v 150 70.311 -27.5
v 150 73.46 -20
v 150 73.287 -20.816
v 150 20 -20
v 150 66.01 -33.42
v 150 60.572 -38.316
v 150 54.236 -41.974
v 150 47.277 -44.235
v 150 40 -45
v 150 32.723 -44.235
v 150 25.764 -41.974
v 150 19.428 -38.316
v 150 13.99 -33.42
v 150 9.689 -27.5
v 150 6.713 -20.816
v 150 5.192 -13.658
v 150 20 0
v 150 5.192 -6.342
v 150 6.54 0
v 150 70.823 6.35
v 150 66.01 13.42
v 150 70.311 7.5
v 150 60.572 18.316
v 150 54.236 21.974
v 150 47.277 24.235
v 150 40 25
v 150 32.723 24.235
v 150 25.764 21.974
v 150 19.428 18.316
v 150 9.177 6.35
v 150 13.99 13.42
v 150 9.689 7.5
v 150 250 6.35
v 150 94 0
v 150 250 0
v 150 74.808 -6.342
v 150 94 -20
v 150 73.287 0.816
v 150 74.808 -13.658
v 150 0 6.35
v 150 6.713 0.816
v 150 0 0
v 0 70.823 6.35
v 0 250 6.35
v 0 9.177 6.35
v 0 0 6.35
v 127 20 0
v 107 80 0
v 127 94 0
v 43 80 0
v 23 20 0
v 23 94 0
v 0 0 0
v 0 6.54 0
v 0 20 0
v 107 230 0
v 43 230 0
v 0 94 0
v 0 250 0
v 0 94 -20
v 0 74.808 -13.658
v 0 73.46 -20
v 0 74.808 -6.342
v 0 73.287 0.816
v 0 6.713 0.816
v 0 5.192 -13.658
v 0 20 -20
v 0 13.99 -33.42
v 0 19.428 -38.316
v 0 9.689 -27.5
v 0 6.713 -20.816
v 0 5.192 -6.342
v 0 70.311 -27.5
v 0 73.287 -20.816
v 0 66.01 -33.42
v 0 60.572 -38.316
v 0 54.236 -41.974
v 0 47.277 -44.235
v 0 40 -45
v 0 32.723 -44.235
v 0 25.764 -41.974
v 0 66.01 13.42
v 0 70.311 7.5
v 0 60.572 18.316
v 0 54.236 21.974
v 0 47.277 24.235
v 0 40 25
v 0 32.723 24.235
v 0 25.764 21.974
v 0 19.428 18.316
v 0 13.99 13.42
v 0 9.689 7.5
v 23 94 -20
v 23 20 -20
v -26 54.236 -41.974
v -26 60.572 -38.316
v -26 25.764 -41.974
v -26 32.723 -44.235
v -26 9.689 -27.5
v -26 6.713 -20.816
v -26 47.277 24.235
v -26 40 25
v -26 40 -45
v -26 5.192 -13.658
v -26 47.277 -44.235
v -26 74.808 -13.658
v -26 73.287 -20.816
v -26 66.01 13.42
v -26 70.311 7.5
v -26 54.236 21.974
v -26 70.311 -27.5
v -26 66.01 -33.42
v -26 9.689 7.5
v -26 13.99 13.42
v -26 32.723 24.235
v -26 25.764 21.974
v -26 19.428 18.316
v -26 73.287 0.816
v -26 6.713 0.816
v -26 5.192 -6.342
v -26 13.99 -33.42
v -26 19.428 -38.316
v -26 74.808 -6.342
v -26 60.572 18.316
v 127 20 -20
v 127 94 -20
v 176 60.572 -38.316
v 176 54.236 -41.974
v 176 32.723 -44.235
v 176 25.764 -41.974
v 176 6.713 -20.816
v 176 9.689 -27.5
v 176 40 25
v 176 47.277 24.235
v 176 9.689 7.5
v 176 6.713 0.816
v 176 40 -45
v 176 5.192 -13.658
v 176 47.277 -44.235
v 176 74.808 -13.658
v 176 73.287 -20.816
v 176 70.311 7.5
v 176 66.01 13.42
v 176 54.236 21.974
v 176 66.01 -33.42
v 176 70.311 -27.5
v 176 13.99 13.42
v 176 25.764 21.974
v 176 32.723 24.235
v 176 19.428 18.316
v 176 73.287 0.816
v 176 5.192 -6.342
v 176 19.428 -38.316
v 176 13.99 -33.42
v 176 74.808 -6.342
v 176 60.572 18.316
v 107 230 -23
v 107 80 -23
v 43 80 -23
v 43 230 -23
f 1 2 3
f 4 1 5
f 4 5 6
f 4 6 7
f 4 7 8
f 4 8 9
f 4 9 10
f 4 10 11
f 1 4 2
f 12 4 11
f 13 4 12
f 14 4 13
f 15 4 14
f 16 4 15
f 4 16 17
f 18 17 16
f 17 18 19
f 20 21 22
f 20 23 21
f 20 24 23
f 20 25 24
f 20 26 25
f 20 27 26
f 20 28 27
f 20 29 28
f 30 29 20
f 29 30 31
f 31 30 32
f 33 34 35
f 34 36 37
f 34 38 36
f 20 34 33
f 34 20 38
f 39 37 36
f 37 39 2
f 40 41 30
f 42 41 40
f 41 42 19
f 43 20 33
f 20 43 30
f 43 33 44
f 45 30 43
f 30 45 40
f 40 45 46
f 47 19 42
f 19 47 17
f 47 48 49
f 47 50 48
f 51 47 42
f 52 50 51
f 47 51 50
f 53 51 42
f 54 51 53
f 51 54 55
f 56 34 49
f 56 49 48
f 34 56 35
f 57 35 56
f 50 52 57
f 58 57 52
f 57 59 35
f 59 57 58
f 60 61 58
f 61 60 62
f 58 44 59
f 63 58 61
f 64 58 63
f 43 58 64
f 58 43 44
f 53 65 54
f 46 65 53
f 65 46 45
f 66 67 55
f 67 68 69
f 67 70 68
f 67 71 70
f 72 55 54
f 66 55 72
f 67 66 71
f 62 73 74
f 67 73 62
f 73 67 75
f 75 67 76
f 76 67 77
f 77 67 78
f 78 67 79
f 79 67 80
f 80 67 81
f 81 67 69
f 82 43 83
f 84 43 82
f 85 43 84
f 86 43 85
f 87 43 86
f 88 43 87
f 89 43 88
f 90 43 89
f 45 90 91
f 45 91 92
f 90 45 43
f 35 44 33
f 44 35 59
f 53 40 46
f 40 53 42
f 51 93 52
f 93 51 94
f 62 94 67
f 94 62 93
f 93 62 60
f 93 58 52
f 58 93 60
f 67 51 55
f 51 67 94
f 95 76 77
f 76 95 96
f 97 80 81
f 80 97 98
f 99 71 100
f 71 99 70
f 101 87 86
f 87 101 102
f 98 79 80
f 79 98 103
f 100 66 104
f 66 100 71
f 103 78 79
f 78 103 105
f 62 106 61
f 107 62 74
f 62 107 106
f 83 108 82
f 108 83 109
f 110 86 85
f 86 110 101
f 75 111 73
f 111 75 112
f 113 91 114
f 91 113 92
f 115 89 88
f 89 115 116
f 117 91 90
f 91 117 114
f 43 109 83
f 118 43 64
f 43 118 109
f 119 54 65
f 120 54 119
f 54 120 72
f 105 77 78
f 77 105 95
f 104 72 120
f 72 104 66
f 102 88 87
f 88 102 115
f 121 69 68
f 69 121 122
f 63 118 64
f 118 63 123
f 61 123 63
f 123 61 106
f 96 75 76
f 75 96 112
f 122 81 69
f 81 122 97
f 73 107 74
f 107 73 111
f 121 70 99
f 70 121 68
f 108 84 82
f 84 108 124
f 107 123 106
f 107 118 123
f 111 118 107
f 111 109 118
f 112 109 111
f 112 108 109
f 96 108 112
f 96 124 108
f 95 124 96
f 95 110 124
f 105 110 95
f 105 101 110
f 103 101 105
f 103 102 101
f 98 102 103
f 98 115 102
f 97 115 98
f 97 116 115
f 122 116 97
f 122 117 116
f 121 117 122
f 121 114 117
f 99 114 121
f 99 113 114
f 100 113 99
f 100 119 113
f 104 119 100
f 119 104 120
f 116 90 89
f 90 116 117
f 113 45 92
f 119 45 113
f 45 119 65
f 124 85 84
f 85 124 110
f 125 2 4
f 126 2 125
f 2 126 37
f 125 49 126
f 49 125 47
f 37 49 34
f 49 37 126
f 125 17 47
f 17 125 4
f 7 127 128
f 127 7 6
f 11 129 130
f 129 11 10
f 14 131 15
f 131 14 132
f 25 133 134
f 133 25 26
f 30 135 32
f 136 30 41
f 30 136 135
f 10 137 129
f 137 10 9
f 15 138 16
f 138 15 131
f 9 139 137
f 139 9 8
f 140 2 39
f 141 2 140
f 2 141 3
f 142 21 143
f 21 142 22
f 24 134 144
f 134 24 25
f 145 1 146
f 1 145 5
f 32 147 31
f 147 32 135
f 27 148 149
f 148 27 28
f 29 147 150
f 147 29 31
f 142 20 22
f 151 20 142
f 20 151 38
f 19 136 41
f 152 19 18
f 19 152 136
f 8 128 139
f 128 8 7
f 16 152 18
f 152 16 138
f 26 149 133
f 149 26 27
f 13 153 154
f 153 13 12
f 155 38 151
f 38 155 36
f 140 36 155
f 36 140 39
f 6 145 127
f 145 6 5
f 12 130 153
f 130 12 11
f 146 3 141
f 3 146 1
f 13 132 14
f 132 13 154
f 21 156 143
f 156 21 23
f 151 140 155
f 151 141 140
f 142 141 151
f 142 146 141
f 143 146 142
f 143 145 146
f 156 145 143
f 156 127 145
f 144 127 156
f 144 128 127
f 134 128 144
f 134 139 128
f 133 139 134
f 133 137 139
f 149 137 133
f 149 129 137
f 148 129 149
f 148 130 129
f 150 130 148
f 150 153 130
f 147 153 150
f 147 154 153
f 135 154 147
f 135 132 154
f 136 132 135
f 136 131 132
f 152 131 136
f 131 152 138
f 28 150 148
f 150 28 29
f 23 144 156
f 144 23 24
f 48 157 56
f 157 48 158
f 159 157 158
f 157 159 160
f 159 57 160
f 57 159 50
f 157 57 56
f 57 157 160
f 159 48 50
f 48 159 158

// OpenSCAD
//base platform
color("brown")
{
    cube([150, 250, 6.35]);
}

//right motor 
translate([0, 20, -20])
{
    cube([23, 74, 20]);
}
//right wheel
translate([-26, 40, -10])
{
    rotate([0, 90, 0])
    {
        color("black")
        {
            cylinder(d = 70, h = 26);
        }
    }
}
//left motor
translate([127, 20, -20])
{
    cube([23, 74, 20]);
}
//right wheel
translate([150, 40, -10])
{
    rotate([0, 90, 0])
    {
        color("black")
        {
            cylinder(d = 70, h = 26);
        }
    }
}
//batery
translate([43, 80, -23])
{
    color("black")
    {
        cube([64, 150, 23]);
    }
}
